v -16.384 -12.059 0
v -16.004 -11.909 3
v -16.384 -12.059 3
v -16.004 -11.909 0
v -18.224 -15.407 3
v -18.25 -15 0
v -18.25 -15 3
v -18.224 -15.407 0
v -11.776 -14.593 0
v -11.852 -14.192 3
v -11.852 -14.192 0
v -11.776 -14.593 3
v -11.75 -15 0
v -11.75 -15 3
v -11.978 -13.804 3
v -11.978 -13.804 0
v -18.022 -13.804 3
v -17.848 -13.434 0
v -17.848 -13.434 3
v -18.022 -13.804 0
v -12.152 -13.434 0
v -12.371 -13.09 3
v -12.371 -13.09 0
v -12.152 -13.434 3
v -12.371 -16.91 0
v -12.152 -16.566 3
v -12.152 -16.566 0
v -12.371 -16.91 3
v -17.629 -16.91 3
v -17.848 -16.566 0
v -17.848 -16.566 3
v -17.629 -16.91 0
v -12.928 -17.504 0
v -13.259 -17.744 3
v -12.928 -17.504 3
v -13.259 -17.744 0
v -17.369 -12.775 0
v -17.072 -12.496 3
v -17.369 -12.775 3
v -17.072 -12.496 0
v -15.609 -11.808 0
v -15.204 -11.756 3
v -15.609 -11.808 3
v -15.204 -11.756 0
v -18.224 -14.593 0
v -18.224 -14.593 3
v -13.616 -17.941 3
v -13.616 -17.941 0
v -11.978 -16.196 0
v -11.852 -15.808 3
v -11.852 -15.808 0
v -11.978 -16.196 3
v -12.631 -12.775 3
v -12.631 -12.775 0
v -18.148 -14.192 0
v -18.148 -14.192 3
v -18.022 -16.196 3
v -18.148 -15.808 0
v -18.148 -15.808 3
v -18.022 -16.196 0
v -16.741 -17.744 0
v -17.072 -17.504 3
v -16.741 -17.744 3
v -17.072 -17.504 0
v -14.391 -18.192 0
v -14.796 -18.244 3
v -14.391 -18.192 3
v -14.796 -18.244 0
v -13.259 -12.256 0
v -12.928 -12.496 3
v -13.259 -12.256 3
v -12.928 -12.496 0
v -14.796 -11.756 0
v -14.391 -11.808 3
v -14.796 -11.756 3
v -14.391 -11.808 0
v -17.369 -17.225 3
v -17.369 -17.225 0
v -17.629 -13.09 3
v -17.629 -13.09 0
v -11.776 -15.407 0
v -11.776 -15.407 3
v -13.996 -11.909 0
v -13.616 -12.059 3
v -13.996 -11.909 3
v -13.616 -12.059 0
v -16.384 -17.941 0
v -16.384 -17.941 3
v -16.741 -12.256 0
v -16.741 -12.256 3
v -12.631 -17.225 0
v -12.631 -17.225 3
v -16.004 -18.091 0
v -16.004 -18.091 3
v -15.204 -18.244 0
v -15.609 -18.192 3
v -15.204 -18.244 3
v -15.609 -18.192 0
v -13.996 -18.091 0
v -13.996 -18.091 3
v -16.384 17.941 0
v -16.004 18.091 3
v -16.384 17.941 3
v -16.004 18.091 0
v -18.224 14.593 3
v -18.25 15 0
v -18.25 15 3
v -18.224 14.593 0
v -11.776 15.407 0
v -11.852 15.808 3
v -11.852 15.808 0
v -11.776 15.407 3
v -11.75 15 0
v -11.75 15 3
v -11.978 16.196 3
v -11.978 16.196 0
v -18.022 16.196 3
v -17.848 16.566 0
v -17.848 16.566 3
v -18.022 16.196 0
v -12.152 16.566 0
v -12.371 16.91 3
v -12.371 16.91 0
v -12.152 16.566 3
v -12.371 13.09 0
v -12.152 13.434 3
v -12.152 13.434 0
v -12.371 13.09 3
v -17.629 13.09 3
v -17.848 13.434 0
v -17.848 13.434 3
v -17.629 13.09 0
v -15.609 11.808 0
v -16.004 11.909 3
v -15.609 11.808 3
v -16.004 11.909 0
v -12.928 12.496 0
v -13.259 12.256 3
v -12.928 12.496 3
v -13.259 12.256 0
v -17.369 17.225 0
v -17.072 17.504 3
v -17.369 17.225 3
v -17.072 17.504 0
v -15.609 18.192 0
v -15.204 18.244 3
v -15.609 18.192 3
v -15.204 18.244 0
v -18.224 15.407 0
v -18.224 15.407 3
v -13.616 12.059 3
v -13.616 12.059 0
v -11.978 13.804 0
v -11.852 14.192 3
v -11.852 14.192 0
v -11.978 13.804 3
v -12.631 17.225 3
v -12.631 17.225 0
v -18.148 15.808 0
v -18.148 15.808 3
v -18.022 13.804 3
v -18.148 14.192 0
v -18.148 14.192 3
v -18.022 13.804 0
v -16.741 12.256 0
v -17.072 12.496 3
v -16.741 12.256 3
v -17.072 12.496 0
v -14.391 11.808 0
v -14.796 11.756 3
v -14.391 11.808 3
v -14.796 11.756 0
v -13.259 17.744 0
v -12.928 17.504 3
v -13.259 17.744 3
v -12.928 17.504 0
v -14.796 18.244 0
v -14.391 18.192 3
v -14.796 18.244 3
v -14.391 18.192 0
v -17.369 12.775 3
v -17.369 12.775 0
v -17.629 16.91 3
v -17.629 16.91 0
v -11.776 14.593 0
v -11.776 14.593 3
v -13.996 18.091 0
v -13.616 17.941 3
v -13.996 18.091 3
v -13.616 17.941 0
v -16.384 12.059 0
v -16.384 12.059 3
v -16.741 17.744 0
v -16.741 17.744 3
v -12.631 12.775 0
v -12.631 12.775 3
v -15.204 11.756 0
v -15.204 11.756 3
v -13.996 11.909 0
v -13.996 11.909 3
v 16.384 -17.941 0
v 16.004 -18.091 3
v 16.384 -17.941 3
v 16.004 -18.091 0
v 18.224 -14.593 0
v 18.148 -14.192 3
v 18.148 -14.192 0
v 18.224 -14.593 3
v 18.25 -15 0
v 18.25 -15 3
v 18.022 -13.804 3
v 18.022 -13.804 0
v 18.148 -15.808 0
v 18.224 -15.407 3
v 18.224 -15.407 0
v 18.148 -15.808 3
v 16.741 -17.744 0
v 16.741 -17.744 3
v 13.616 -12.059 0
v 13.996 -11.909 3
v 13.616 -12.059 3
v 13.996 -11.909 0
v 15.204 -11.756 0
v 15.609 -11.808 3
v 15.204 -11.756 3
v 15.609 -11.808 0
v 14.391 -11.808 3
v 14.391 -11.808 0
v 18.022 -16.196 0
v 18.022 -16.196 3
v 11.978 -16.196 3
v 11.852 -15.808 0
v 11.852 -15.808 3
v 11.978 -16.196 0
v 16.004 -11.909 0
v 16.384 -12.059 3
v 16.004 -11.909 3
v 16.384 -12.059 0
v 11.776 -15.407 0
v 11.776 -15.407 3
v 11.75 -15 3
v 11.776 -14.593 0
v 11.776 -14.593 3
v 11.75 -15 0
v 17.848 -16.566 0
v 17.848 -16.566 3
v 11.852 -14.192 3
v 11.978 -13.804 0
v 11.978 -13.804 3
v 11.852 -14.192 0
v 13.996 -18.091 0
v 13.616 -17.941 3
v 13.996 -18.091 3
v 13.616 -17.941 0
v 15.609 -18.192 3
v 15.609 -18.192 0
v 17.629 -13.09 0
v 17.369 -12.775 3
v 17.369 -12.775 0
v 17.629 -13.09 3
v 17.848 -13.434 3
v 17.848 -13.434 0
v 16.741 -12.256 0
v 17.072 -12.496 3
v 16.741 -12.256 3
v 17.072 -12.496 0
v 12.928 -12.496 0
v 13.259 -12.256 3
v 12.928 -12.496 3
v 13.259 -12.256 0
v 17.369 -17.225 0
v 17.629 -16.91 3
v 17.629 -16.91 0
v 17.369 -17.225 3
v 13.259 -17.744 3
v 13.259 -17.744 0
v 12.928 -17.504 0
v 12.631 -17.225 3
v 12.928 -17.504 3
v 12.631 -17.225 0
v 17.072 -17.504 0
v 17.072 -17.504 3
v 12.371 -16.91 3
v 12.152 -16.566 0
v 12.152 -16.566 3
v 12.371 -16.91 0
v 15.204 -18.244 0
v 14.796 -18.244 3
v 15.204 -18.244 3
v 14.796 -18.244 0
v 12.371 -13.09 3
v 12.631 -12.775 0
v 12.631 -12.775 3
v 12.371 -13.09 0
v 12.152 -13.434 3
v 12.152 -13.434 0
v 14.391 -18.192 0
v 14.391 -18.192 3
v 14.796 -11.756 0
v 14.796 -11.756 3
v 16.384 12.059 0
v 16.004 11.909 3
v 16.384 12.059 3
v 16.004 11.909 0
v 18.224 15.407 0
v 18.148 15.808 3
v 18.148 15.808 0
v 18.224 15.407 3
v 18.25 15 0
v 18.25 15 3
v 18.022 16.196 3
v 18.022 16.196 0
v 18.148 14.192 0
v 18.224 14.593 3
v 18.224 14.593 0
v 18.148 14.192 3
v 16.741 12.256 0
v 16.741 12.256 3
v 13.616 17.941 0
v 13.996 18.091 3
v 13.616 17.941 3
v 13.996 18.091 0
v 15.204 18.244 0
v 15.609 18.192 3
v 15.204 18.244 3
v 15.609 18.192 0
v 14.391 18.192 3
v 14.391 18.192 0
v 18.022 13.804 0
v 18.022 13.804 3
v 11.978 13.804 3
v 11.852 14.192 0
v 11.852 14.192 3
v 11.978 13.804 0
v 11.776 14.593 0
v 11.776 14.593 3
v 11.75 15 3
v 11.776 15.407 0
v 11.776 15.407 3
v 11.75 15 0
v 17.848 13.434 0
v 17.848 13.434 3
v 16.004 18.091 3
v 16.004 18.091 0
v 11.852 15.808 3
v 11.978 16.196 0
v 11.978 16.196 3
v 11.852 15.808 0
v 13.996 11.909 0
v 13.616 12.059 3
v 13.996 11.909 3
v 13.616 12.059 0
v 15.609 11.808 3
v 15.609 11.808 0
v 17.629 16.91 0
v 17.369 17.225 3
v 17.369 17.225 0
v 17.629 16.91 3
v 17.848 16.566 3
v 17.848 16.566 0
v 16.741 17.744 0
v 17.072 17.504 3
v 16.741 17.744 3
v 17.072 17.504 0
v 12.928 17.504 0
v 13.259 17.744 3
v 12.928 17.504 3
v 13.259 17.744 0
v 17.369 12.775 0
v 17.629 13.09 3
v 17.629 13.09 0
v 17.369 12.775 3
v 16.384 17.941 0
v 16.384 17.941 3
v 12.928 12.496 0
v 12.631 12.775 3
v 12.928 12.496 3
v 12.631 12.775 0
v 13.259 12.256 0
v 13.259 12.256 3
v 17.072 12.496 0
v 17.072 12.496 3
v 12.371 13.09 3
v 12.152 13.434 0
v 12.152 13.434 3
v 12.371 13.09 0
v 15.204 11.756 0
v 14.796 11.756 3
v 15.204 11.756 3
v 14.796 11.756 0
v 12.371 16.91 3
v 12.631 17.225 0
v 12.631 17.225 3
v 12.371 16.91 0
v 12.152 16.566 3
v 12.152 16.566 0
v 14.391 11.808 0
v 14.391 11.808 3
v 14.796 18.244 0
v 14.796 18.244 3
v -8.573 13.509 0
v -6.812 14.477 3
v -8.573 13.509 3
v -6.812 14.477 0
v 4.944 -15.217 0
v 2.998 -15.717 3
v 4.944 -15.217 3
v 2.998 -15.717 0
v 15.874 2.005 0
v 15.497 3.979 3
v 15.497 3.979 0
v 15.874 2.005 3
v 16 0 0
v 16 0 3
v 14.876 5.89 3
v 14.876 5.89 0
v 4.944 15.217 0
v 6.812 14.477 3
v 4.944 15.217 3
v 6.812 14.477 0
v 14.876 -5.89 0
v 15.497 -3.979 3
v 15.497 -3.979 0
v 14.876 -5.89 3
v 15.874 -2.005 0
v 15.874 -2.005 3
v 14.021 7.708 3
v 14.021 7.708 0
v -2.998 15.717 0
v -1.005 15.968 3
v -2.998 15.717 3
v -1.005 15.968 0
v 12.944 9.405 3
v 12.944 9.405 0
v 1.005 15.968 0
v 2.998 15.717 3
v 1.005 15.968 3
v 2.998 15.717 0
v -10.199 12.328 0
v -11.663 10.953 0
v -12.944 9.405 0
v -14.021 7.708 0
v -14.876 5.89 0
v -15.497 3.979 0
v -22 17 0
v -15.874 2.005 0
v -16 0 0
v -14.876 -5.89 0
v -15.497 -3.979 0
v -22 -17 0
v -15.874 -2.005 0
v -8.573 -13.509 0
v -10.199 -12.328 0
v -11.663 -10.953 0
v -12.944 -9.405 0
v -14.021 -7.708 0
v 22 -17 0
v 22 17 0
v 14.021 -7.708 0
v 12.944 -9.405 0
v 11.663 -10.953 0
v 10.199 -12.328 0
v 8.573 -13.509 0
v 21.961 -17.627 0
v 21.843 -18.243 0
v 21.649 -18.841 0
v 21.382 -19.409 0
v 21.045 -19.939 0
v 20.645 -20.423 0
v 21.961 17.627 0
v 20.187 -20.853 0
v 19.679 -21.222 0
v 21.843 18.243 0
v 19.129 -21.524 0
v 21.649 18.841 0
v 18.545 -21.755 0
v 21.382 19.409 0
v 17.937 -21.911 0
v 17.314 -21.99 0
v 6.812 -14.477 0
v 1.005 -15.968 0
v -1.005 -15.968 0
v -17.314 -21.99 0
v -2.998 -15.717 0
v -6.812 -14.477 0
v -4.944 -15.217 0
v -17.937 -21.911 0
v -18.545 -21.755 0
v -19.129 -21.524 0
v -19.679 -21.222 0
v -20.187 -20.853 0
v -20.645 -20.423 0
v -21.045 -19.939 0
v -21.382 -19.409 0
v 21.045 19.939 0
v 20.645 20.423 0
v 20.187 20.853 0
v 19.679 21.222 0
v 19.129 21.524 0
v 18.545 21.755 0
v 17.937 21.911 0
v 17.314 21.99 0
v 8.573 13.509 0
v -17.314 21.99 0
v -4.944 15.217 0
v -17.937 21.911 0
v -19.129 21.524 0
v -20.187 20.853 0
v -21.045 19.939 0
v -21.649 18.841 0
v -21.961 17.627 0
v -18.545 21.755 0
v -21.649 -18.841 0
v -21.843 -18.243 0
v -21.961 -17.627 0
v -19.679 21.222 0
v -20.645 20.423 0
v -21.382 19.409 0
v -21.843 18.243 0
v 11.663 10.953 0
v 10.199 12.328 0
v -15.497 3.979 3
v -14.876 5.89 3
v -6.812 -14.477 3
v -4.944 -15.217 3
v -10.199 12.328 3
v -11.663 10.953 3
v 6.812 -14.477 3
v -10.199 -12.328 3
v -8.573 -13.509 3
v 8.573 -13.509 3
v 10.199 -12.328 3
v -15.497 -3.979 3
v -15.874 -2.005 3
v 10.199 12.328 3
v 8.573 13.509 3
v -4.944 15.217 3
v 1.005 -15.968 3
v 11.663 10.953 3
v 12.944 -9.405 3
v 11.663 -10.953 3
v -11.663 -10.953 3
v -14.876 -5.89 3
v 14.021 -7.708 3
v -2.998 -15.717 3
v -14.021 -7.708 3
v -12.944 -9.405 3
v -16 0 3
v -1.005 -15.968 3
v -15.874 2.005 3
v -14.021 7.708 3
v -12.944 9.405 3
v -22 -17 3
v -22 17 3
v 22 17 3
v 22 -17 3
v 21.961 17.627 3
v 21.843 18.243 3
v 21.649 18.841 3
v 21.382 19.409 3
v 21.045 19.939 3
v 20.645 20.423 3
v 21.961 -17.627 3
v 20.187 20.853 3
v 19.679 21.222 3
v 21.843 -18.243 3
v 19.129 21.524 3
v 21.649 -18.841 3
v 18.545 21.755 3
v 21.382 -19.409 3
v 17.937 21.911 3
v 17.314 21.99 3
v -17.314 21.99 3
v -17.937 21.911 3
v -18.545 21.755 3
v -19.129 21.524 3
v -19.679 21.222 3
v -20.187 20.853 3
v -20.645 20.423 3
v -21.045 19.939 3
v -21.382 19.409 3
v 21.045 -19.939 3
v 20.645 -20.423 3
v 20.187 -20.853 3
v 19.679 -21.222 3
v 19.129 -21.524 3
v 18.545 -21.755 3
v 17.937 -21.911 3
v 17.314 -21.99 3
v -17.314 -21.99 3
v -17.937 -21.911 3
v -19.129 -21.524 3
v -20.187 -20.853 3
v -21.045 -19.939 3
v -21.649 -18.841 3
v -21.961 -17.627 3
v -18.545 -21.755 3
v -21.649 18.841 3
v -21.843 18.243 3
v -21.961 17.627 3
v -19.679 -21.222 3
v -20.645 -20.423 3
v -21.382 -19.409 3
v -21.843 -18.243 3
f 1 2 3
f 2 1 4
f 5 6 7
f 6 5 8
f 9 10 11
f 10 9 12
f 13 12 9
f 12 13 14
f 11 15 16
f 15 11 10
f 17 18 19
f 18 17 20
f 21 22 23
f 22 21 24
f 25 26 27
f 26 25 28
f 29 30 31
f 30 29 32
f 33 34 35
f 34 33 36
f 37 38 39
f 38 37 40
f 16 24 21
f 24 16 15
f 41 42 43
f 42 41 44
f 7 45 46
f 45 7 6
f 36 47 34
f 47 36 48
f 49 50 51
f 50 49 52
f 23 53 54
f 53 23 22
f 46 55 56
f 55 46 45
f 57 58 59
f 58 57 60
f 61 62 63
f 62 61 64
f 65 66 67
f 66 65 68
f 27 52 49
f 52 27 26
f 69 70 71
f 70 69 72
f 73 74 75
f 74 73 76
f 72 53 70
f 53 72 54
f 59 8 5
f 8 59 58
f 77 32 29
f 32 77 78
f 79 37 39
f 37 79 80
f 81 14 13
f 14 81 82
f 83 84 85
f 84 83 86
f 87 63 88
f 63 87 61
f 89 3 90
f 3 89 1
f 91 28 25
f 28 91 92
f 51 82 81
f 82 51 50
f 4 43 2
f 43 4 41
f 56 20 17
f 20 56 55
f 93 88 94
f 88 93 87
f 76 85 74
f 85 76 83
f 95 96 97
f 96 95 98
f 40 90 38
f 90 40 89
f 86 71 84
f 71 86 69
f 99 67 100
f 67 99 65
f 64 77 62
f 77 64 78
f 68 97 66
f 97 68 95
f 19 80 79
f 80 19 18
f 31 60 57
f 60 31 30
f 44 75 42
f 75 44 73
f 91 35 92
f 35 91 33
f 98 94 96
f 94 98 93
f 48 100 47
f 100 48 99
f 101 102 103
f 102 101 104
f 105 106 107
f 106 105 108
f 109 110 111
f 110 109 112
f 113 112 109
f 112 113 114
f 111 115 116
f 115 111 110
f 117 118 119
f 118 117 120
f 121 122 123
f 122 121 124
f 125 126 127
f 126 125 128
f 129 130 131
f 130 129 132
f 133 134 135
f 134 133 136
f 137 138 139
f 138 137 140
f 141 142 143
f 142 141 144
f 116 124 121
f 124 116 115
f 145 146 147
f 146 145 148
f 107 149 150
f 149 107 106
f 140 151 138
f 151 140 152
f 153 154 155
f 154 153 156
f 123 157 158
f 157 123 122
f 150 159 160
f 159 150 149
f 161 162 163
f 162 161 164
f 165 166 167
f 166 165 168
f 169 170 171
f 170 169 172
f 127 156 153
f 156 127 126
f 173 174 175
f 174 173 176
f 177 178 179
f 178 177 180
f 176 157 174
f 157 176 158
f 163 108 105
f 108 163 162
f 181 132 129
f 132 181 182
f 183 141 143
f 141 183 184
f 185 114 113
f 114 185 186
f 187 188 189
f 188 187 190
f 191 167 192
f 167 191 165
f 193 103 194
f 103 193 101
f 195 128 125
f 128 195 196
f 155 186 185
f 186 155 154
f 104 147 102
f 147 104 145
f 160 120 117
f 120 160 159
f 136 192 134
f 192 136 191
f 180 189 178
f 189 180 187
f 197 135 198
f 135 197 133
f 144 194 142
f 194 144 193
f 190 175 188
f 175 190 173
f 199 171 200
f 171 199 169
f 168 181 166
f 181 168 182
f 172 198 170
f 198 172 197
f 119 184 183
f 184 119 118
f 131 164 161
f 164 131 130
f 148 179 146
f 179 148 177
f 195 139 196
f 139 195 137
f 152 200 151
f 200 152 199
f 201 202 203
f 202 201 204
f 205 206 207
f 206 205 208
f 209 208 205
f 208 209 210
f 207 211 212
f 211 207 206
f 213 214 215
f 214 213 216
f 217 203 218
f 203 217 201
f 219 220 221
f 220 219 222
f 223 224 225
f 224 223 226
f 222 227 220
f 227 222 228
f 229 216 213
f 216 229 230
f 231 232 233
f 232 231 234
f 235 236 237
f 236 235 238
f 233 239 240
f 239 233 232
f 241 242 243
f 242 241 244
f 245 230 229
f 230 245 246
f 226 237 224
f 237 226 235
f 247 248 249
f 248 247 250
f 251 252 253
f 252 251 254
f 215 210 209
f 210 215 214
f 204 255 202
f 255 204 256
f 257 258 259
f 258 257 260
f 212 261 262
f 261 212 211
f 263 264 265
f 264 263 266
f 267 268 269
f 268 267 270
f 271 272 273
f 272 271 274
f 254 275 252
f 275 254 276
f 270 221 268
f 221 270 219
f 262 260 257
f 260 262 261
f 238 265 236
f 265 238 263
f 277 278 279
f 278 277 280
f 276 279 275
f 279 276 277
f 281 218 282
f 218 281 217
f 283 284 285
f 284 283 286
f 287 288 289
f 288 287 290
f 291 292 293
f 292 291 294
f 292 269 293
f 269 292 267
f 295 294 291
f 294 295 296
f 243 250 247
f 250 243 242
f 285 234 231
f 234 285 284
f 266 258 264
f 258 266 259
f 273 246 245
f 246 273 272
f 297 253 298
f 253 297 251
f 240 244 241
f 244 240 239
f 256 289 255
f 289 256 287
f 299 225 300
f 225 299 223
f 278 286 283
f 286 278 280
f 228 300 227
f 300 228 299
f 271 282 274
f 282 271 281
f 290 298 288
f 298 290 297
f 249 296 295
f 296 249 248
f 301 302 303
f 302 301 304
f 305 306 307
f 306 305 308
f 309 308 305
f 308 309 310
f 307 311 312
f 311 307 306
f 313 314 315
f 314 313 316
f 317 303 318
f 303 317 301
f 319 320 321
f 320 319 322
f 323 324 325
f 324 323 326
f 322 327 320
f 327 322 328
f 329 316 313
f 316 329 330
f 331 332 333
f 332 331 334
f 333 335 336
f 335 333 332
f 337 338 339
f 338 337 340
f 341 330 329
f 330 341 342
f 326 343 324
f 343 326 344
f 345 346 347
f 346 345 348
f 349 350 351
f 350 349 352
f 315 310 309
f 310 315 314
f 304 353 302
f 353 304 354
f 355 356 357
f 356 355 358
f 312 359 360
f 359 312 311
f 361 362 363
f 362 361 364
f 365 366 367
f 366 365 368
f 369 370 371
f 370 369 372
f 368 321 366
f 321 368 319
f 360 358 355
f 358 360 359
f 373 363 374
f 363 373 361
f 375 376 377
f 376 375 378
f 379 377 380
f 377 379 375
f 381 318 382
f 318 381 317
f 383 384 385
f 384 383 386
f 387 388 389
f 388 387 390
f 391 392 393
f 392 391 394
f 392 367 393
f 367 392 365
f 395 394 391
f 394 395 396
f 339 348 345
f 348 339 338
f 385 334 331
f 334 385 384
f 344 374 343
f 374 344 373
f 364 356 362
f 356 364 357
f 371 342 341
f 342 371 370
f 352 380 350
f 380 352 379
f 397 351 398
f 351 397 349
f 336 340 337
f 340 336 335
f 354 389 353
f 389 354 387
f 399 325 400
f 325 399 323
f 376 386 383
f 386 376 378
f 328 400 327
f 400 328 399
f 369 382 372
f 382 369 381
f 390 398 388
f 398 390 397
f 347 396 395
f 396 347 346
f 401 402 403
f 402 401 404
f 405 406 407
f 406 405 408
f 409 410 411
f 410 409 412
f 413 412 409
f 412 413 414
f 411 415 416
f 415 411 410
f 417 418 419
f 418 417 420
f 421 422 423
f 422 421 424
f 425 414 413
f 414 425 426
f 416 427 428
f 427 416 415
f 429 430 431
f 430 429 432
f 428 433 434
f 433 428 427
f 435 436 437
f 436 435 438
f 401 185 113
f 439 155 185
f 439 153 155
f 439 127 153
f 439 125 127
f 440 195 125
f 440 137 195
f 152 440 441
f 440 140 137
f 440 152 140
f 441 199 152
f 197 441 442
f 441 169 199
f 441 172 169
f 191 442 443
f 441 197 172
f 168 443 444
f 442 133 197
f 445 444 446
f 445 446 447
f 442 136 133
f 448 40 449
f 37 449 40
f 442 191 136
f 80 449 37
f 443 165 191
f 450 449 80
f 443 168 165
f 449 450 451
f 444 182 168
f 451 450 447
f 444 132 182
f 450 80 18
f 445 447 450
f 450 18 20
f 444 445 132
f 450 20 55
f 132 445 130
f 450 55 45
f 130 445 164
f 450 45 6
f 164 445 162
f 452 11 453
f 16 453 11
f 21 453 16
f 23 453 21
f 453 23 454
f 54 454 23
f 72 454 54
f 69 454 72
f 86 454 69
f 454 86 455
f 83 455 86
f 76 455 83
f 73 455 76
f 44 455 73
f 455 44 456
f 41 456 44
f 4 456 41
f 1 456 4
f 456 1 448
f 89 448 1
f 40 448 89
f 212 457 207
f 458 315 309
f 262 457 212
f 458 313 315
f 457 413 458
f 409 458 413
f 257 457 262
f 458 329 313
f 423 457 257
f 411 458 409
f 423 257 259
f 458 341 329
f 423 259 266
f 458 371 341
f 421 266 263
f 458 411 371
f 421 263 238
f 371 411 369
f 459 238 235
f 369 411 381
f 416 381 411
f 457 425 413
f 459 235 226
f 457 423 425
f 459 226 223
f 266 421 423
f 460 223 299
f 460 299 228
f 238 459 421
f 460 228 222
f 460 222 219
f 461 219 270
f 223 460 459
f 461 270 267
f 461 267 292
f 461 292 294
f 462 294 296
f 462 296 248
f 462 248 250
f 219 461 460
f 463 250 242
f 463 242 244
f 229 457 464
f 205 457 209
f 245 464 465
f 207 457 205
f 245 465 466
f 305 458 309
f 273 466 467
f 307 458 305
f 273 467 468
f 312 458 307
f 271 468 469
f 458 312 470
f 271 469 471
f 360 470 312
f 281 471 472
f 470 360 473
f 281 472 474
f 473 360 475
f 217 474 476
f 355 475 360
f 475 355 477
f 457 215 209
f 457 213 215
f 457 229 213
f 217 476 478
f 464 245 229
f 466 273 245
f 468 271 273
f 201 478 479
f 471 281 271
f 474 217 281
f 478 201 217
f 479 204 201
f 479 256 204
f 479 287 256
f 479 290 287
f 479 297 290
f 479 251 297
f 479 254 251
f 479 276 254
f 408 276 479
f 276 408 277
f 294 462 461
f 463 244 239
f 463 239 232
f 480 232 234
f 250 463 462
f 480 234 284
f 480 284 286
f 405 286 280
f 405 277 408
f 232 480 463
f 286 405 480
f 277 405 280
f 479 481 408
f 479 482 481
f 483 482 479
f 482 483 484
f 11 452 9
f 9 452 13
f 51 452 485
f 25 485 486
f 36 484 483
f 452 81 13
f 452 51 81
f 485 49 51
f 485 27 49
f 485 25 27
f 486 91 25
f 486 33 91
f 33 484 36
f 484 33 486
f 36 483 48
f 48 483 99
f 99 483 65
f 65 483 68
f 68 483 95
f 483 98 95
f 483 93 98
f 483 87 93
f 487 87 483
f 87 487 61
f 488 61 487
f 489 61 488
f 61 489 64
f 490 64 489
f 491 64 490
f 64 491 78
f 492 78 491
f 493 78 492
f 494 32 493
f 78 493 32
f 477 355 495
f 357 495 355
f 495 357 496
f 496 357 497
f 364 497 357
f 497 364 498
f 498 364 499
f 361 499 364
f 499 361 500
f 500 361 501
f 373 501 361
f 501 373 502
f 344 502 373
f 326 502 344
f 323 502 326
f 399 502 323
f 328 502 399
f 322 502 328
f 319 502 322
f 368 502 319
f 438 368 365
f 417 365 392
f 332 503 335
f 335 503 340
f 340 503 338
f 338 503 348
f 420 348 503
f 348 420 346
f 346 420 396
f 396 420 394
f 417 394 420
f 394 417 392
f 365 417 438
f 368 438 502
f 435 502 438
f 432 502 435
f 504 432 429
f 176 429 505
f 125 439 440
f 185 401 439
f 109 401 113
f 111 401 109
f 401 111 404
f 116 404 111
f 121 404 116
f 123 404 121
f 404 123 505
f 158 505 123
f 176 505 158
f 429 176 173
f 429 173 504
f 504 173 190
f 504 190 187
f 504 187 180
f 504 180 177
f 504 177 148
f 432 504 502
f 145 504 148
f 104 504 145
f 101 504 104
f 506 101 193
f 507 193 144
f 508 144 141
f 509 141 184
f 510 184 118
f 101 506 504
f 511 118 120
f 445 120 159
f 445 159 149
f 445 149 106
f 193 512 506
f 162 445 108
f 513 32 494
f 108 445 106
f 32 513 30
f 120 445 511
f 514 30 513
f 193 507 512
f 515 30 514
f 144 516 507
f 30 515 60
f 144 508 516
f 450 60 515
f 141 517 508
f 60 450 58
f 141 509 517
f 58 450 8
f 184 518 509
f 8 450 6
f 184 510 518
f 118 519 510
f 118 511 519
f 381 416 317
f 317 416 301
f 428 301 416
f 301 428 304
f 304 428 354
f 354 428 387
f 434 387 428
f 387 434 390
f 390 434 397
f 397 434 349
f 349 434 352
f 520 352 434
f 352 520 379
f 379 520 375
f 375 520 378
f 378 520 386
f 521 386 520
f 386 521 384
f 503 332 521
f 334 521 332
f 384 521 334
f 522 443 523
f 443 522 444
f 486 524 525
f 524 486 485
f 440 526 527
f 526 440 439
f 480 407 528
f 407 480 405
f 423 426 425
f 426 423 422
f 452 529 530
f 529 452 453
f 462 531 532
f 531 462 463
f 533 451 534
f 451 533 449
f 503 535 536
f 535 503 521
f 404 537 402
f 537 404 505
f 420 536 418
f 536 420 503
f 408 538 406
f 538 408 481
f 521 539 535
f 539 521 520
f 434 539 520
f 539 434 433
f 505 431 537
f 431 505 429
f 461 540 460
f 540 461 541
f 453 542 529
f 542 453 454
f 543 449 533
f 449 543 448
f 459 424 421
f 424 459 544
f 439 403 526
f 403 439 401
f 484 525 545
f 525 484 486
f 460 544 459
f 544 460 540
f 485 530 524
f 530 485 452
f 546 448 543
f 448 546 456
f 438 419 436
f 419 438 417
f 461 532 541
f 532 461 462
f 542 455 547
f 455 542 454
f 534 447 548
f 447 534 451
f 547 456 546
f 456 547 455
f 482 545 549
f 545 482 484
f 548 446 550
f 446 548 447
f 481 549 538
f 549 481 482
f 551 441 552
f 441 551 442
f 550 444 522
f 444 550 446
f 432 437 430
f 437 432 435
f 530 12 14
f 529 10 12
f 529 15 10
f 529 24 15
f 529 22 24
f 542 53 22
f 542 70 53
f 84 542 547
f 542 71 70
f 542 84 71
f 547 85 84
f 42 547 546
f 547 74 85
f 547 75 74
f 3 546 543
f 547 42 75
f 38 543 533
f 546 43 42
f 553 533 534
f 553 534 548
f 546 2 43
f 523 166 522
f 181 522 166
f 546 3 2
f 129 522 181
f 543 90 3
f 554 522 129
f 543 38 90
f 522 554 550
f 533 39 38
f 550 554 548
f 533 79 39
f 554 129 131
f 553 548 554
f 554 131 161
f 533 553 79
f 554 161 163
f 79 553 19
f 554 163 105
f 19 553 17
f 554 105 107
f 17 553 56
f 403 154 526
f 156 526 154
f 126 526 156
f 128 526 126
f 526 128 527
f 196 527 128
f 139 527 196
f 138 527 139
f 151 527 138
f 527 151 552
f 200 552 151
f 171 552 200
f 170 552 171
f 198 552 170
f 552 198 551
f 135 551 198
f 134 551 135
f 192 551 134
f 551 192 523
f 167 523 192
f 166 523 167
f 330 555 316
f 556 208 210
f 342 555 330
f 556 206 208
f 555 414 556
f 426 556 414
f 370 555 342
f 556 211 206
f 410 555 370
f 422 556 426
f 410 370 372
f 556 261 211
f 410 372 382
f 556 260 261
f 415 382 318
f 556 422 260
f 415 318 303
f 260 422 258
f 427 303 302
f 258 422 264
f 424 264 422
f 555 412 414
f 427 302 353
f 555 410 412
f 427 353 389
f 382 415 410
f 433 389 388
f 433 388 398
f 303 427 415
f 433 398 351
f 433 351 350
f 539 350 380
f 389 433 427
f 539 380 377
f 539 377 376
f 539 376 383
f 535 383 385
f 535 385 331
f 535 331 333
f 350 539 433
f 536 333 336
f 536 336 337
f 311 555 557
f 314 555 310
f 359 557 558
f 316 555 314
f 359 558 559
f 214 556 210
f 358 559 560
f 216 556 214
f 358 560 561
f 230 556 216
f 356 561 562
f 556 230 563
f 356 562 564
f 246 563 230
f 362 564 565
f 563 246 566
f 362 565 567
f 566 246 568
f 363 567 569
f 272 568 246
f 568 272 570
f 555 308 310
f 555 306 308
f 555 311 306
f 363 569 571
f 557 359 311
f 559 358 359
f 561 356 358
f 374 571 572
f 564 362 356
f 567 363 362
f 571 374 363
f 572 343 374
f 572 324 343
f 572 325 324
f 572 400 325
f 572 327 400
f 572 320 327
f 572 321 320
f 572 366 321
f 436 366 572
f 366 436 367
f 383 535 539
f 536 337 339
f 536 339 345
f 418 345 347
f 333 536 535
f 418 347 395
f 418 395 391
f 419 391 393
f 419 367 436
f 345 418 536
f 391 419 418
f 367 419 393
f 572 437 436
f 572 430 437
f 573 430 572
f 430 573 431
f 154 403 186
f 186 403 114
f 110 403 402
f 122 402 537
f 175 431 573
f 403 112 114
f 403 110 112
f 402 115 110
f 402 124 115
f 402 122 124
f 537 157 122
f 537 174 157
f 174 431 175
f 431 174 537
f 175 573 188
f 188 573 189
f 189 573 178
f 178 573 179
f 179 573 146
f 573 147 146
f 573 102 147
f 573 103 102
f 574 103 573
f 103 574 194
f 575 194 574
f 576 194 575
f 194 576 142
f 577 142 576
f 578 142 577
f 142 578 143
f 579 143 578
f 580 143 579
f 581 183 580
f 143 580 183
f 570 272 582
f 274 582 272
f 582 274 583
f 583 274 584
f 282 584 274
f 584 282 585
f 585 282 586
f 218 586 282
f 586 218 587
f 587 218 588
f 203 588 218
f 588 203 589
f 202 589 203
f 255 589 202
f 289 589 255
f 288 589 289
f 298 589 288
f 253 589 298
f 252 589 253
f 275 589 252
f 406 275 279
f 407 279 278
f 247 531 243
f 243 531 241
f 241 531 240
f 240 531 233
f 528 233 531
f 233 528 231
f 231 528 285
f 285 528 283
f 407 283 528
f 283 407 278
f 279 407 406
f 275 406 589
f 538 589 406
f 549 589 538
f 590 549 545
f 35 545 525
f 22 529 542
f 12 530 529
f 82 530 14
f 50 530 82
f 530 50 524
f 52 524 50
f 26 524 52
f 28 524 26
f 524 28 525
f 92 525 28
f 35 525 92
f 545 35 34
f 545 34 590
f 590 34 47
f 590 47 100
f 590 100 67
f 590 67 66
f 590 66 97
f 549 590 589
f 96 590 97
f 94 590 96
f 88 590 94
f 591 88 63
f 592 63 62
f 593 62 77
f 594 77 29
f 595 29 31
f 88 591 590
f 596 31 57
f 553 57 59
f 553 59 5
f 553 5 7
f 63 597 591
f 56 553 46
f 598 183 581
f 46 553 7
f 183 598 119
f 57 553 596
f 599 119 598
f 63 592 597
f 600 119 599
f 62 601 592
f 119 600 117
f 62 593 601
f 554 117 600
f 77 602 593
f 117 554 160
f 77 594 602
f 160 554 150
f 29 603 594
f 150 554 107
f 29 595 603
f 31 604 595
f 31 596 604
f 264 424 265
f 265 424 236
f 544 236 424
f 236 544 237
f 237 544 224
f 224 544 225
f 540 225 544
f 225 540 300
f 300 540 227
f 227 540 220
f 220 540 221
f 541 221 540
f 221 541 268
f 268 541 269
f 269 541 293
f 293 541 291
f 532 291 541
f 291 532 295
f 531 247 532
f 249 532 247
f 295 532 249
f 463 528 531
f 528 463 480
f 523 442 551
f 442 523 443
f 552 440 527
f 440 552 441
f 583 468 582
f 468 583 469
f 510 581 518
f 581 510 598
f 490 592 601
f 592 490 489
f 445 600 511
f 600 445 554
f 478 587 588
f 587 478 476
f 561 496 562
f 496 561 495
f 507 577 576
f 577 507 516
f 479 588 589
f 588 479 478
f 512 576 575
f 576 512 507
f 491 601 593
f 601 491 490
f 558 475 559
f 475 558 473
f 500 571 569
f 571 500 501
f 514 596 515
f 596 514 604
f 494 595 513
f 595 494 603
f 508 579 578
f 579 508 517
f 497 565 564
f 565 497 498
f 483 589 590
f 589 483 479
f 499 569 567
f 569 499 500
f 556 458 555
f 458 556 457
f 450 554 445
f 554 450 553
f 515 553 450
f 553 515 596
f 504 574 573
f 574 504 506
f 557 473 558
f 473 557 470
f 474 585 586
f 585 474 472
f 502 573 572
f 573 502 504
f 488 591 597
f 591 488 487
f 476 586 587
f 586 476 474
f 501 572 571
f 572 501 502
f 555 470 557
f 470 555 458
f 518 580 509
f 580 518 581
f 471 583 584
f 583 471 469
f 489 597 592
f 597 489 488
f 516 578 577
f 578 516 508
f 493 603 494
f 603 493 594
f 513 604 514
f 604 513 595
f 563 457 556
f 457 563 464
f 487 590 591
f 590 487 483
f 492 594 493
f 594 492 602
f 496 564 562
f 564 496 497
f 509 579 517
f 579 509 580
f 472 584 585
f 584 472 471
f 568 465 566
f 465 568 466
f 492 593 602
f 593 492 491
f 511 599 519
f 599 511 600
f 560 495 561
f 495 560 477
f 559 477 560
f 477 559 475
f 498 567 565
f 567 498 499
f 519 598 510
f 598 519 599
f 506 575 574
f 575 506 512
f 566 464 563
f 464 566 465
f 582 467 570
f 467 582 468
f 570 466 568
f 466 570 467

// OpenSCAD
$fn = 50;

difference() {
	union() {
		hull() {
			translate(v = [-17.0, 17.0, 0]) {
				cylinder(h = 3, r = 5);
			}
			translate(v = [17.0, 17.0, 0]) {
				cylinder(h = 3, r = 5);
			}
			translate(v = [-17.0, -17.0, 0]) {
				cylinder(h = 3, r = 5);
			}
			translate(v = [17.0, -17.0, 0]) {
				cylinder(h = 3, r = 5);
			}
		}
	}
	union() {
		translate(v = [-15.0, -15.0, -100.0]) {
			cylinder(h = 200, r = 3.25);
		}
		translate(v = [-15.0, 15.0, -100.0]) {
			cylinder(h = 200, r = 3.25);
		}
		translate(v = [15.0, -15.0, -100.0]) {
			cylinder(h = 200, r = 3.25);
		}
		translate(v = [15.0, 15.0, -100.0]) {
			cylinder(h = 200, r = 3.25);
		}
		translate(v = [-15.0, -15.0, -100.0]) {
			cylinder(h = 200, r = 1.8);
		}
		translate(v = [-15.0, 15.0, -100.0]) {
			cylinder(h = 200, r = 1.8);
		}
		translate(v = [15.0, -15.0, -100.0]) {
			cylinder(h = 200, r = 1.8);
		}
		translate(v = [15.0, 15.0, -100.0]) {
			cylinder(h = 200, r = 1.8);
		}
		cylinder(h = 3, r = 16.0);
	}
}
